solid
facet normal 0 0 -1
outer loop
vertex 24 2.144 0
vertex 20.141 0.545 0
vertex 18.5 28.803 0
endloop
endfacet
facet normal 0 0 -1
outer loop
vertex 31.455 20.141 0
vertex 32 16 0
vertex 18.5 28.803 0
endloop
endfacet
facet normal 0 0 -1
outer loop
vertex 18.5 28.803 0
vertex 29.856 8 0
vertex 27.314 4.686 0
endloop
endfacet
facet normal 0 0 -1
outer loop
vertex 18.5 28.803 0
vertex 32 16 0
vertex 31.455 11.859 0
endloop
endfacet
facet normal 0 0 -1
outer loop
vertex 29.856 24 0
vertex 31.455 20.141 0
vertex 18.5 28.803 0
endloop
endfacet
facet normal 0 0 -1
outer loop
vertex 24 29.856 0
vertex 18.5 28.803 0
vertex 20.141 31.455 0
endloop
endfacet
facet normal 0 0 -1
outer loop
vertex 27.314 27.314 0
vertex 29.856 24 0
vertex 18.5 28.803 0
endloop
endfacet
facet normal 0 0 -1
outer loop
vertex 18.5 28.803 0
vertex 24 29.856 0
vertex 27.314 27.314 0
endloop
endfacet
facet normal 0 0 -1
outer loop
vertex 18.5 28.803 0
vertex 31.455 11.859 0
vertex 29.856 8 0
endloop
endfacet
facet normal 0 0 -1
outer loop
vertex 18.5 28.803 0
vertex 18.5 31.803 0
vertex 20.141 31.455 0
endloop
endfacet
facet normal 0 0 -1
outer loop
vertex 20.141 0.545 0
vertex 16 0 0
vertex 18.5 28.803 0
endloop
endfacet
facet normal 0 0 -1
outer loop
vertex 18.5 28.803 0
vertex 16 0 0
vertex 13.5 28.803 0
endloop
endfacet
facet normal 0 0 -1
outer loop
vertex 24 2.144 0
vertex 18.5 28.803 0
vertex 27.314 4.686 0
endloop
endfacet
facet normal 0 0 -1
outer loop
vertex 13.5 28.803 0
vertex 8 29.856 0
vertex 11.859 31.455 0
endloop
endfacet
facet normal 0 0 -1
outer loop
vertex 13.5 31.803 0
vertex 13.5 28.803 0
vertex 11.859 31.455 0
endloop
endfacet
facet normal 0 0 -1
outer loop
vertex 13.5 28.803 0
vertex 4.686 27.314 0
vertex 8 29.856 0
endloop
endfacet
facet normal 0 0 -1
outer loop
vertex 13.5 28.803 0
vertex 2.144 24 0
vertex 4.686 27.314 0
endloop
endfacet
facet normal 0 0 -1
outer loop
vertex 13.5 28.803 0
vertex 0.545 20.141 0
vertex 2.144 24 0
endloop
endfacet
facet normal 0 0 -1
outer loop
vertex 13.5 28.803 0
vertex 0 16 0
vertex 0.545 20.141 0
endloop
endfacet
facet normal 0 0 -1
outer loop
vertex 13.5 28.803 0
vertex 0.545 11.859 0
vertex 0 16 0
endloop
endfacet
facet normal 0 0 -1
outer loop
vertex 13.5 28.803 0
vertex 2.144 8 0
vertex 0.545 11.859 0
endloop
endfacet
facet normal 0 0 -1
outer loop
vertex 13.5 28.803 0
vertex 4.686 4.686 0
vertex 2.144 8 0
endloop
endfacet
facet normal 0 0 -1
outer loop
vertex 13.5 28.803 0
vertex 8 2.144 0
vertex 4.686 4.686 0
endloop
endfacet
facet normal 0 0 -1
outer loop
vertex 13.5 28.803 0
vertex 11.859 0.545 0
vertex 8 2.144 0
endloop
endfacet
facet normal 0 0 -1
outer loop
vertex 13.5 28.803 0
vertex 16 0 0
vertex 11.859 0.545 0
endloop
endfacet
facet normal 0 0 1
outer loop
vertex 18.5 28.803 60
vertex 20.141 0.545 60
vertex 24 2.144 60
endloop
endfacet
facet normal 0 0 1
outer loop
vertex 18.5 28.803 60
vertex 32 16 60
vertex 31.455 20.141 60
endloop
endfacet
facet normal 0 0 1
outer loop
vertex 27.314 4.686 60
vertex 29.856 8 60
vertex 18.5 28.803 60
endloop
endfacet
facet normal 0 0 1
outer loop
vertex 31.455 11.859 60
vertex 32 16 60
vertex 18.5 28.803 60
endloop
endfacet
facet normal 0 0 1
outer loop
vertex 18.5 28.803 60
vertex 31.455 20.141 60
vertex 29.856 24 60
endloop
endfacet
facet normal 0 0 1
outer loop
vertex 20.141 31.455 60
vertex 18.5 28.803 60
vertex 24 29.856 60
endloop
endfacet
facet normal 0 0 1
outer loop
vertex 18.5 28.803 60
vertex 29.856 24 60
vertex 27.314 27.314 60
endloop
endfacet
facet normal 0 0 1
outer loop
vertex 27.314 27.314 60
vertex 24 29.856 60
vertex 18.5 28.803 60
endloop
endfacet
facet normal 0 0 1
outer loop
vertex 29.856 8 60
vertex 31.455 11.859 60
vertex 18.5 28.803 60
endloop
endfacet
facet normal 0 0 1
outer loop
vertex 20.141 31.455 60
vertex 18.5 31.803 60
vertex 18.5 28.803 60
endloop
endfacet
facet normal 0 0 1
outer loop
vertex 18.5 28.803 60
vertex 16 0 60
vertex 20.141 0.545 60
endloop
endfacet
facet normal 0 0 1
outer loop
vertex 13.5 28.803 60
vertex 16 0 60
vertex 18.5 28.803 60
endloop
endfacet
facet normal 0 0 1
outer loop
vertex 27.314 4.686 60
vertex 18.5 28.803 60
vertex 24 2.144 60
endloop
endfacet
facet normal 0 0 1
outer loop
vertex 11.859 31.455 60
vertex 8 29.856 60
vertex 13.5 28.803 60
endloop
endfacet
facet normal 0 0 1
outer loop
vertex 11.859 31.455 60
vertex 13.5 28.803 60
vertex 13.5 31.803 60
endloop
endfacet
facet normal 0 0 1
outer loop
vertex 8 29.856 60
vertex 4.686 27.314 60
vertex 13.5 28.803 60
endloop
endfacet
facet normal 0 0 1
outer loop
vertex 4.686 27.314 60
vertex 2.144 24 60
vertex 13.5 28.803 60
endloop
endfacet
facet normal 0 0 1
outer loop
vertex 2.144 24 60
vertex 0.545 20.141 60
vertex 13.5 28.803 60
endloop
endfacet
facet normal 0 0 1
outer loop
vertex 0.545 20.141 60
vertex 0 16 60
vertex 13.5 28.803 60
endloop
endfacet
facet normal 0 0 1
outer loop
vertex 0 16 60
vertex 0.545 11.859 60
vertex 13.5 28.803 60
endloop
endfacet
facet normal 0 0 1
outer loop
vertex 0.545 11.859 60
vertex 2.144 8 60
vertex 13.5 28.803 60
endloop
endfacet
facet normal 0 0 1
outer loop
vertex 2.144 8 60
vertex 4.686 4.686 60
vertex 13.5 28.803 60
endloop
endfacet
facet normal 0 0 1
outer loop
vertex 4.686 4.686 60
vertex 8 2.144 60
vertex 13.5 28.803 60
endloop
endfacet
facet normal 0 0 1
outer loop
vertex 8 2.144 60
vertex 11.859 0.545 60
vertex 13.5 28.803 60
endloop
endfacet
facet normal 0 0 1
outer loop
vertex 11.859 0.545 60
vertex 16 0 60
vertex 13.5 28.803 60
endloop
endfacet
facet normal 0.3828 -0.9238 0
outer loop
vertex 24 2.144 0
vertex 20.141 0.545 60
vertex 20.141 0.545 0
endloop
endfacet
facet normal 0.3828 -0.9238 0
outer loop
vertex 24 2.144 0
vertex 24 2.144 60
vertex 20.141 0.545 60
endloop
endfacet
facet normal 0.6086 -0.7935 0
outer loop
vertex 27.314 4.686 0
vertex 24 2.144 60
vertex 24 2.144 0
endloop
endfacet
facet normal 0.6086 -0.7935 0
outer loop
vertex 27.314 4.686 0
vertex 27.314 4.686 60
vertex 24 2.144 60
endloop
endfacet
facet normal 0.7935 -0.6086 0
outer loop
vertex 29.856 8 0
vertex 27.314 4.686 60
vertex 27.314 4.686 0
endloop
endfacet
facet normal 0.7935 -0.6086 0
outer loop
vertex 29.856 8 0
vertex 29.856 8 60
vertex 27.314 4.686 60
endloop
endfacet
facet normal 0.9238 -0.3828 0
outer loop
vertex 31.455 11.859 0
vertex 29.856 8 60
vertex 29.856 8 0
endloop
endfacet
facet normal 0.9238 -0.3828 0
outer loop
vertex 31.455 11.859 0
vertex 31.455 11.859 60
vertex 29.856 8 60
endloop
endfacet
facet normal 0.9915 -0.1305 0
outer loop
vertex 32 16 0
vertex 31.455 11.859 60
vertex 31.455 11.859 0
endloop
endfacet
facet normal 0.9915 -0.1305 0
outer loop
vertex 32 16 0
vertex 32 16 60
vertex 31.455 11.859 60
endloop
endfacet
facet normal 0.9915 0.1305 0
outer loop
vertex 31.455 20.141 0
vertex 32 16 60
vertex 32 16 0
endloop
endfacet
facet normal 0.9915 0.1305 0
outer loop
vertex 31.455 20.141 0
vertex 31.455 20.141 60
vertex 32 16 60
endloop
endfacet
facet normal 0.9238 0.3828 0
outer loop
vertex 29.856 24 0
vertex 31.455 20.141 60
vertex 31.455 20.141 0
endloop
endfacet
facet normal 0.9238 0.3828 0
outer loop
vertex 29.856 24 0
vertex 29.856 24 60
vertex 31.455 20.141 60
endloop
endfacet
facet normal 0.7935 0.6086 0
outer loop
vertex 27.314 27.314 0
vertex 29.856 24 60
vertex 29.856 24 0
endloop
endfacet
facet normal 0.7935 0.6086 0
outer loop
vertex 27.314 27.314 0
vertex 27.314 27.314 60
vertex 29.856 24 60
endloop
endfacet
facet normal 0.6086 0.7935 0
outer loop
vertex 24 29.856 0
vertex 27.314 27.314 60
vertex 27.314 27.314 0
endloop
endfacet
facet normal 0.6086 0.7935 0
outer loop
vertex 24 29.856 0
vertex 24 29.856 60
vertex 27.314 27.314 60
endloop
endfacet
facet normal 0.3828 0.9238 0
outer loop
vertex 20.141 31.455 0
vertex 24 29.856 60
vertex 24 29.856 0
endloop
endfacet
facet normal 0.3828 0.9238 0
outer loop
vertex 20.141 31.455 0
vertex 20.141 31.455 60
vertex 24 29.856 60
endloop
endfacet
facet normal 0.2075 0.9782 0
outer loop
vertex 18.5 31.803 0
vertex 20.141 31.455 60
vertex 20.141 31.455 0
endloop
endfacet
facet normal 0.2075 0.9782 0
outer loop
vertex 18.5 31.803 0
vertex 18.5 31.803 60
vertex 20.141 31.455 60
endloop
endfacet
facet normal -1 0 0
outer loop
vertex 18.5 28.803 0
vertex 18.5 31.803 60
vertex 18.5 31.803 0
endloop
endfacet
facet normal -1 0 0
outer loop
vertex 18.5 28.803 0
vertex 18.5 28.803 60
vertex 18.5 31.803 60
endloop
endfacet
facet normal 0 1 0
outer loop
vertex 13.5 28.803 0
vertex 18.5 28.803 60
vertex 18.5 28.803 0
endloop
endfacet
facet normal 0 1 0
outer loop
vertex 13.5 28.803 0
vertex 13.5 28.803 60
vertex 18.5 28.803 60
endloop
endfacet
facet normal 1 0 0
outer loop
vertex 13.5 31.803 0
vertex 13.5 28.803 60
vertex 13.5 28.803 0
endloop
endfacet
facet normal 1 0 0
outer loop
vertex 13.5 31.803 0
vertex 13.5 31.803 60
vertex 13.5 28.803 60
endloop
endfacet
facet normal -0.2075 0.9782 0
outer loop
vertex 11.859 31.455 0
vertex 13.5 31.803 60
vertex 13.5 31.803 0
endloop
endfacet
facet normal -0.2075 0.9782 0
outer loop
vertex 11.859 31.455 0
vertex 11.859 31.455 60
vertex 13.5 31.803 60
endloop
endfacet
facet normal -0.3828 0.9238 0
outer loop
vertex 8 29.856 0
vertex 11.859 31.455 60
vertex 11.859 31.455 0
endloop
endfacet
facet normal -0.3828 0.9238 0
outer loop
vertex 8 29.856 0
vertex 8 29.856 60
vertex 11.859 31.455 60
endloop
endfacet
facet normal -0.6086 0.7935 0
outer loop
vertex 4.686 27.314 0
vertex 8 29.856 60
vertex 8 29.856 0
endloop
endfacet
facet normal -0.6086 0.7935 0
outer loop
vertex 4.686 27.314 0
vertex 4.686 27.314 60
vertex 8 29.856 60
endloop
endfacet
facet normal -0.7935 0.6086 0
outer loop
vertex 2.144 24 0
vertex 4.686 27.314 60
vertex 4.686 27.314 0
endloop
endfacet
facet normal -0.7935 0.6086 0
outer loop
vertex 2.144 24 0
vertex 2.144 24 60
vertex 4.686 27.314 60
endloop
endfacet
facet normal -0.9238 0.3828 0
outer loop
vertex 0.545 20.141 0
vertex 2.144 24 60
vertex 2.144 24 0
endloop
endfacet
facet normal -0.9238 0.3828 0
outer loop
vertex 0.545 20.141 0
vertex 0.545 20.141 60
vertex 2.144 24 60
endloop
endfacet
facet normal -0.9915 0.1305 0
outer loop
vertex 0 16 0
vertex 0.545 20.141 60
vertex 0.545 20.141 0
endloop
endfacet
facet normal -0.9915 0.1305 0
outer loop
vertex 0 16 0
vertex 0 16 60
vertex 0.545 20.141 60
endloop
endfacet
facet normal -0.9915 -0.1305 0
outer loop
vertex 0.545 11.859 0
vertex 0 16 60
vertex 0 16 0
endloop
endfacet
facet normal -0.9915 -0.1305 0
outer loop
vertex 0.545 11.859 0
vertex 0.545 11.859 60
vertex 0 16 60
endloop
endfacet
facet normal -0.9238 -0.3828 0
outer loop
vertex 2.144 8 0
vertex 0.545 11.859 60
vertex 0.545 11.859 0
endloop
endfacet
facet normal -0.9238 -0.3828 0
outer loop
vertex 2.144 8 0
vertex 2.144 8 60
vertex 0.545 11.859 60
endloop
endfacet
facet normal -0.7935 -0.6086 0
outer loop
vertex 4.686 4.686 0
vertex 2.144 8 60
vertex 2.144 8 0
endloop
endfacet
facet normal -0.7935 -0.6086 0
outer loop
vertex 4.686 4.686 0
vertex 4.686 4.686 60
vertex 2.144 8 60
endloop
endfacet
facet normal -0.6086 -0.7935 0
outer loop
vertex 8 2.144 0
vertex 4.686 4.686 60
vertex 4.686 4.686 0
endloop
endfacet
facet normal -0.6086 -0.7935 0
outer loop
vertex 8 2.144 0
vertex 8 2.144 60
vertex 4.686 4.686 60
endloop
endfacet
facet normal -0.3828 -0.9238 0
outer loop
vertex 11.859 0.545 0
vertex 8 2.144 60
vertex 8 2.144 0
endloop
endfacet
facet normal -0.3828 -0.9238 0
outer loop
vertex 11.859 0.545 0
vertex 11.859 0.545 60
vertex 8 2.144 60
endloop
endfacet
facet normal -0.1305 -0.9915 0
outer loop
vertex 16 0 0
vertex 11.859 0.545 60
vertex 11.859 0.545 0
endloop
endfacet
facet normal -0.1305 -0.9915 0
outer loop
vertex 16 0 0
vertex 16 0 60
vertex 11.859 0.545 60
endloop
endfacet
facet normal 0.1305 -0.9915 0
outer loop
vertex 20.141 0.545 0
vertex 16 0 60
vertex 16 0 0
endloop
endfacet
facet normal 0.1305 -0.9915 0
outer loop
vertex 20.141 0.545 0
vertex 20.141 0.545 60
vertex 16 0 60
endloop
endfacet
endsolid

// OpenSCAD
$fn = 32;

// ----------------------------------------------------------------------
// Keyway shaft: d32 shaft, key 5 x 3 mm
// ----------------------------------------------------------------------

// --- parameters (mm) ---
shaft_r = 16;             // shaft radius
key_w = 5;                // keyway width
key_d = 3;                // keyway depth below the surface line
plate_t = 60;             // shaft length, Z (extrusion height)

shaft_d = 2 * shaft_r;  // shaft diameter
circle_step = 15;  // polygon sampling step, degrees

profile = [[11.859, 31.455], [8, 29.856], [4.686, 27.314], [2.144, 24], [0.545, 20.141], [0, 16], [0.545, 11.859], [2.144, 8], [4.686, 4.686], [8, 2.144], [11.859, 0.545], [16, 0], [20.141, 0.545], [24, 2.144], [27.314, 4.686], [29.856, 8], [31.455, 11.859], [32, 16], [31.455, 20.141], [29.856, 24], [27.314, 27.314], [24, 29.856], [20.141, 31.455], [18.5, 31.803], [18.5, 28.803], [13.5, 28.803], [13.5, 31.803]];  // primary outline, 27 points, counter clockwise

// --- the one profile operation ---
linear_extrude(height = plate_t) polygon(points = profile);
